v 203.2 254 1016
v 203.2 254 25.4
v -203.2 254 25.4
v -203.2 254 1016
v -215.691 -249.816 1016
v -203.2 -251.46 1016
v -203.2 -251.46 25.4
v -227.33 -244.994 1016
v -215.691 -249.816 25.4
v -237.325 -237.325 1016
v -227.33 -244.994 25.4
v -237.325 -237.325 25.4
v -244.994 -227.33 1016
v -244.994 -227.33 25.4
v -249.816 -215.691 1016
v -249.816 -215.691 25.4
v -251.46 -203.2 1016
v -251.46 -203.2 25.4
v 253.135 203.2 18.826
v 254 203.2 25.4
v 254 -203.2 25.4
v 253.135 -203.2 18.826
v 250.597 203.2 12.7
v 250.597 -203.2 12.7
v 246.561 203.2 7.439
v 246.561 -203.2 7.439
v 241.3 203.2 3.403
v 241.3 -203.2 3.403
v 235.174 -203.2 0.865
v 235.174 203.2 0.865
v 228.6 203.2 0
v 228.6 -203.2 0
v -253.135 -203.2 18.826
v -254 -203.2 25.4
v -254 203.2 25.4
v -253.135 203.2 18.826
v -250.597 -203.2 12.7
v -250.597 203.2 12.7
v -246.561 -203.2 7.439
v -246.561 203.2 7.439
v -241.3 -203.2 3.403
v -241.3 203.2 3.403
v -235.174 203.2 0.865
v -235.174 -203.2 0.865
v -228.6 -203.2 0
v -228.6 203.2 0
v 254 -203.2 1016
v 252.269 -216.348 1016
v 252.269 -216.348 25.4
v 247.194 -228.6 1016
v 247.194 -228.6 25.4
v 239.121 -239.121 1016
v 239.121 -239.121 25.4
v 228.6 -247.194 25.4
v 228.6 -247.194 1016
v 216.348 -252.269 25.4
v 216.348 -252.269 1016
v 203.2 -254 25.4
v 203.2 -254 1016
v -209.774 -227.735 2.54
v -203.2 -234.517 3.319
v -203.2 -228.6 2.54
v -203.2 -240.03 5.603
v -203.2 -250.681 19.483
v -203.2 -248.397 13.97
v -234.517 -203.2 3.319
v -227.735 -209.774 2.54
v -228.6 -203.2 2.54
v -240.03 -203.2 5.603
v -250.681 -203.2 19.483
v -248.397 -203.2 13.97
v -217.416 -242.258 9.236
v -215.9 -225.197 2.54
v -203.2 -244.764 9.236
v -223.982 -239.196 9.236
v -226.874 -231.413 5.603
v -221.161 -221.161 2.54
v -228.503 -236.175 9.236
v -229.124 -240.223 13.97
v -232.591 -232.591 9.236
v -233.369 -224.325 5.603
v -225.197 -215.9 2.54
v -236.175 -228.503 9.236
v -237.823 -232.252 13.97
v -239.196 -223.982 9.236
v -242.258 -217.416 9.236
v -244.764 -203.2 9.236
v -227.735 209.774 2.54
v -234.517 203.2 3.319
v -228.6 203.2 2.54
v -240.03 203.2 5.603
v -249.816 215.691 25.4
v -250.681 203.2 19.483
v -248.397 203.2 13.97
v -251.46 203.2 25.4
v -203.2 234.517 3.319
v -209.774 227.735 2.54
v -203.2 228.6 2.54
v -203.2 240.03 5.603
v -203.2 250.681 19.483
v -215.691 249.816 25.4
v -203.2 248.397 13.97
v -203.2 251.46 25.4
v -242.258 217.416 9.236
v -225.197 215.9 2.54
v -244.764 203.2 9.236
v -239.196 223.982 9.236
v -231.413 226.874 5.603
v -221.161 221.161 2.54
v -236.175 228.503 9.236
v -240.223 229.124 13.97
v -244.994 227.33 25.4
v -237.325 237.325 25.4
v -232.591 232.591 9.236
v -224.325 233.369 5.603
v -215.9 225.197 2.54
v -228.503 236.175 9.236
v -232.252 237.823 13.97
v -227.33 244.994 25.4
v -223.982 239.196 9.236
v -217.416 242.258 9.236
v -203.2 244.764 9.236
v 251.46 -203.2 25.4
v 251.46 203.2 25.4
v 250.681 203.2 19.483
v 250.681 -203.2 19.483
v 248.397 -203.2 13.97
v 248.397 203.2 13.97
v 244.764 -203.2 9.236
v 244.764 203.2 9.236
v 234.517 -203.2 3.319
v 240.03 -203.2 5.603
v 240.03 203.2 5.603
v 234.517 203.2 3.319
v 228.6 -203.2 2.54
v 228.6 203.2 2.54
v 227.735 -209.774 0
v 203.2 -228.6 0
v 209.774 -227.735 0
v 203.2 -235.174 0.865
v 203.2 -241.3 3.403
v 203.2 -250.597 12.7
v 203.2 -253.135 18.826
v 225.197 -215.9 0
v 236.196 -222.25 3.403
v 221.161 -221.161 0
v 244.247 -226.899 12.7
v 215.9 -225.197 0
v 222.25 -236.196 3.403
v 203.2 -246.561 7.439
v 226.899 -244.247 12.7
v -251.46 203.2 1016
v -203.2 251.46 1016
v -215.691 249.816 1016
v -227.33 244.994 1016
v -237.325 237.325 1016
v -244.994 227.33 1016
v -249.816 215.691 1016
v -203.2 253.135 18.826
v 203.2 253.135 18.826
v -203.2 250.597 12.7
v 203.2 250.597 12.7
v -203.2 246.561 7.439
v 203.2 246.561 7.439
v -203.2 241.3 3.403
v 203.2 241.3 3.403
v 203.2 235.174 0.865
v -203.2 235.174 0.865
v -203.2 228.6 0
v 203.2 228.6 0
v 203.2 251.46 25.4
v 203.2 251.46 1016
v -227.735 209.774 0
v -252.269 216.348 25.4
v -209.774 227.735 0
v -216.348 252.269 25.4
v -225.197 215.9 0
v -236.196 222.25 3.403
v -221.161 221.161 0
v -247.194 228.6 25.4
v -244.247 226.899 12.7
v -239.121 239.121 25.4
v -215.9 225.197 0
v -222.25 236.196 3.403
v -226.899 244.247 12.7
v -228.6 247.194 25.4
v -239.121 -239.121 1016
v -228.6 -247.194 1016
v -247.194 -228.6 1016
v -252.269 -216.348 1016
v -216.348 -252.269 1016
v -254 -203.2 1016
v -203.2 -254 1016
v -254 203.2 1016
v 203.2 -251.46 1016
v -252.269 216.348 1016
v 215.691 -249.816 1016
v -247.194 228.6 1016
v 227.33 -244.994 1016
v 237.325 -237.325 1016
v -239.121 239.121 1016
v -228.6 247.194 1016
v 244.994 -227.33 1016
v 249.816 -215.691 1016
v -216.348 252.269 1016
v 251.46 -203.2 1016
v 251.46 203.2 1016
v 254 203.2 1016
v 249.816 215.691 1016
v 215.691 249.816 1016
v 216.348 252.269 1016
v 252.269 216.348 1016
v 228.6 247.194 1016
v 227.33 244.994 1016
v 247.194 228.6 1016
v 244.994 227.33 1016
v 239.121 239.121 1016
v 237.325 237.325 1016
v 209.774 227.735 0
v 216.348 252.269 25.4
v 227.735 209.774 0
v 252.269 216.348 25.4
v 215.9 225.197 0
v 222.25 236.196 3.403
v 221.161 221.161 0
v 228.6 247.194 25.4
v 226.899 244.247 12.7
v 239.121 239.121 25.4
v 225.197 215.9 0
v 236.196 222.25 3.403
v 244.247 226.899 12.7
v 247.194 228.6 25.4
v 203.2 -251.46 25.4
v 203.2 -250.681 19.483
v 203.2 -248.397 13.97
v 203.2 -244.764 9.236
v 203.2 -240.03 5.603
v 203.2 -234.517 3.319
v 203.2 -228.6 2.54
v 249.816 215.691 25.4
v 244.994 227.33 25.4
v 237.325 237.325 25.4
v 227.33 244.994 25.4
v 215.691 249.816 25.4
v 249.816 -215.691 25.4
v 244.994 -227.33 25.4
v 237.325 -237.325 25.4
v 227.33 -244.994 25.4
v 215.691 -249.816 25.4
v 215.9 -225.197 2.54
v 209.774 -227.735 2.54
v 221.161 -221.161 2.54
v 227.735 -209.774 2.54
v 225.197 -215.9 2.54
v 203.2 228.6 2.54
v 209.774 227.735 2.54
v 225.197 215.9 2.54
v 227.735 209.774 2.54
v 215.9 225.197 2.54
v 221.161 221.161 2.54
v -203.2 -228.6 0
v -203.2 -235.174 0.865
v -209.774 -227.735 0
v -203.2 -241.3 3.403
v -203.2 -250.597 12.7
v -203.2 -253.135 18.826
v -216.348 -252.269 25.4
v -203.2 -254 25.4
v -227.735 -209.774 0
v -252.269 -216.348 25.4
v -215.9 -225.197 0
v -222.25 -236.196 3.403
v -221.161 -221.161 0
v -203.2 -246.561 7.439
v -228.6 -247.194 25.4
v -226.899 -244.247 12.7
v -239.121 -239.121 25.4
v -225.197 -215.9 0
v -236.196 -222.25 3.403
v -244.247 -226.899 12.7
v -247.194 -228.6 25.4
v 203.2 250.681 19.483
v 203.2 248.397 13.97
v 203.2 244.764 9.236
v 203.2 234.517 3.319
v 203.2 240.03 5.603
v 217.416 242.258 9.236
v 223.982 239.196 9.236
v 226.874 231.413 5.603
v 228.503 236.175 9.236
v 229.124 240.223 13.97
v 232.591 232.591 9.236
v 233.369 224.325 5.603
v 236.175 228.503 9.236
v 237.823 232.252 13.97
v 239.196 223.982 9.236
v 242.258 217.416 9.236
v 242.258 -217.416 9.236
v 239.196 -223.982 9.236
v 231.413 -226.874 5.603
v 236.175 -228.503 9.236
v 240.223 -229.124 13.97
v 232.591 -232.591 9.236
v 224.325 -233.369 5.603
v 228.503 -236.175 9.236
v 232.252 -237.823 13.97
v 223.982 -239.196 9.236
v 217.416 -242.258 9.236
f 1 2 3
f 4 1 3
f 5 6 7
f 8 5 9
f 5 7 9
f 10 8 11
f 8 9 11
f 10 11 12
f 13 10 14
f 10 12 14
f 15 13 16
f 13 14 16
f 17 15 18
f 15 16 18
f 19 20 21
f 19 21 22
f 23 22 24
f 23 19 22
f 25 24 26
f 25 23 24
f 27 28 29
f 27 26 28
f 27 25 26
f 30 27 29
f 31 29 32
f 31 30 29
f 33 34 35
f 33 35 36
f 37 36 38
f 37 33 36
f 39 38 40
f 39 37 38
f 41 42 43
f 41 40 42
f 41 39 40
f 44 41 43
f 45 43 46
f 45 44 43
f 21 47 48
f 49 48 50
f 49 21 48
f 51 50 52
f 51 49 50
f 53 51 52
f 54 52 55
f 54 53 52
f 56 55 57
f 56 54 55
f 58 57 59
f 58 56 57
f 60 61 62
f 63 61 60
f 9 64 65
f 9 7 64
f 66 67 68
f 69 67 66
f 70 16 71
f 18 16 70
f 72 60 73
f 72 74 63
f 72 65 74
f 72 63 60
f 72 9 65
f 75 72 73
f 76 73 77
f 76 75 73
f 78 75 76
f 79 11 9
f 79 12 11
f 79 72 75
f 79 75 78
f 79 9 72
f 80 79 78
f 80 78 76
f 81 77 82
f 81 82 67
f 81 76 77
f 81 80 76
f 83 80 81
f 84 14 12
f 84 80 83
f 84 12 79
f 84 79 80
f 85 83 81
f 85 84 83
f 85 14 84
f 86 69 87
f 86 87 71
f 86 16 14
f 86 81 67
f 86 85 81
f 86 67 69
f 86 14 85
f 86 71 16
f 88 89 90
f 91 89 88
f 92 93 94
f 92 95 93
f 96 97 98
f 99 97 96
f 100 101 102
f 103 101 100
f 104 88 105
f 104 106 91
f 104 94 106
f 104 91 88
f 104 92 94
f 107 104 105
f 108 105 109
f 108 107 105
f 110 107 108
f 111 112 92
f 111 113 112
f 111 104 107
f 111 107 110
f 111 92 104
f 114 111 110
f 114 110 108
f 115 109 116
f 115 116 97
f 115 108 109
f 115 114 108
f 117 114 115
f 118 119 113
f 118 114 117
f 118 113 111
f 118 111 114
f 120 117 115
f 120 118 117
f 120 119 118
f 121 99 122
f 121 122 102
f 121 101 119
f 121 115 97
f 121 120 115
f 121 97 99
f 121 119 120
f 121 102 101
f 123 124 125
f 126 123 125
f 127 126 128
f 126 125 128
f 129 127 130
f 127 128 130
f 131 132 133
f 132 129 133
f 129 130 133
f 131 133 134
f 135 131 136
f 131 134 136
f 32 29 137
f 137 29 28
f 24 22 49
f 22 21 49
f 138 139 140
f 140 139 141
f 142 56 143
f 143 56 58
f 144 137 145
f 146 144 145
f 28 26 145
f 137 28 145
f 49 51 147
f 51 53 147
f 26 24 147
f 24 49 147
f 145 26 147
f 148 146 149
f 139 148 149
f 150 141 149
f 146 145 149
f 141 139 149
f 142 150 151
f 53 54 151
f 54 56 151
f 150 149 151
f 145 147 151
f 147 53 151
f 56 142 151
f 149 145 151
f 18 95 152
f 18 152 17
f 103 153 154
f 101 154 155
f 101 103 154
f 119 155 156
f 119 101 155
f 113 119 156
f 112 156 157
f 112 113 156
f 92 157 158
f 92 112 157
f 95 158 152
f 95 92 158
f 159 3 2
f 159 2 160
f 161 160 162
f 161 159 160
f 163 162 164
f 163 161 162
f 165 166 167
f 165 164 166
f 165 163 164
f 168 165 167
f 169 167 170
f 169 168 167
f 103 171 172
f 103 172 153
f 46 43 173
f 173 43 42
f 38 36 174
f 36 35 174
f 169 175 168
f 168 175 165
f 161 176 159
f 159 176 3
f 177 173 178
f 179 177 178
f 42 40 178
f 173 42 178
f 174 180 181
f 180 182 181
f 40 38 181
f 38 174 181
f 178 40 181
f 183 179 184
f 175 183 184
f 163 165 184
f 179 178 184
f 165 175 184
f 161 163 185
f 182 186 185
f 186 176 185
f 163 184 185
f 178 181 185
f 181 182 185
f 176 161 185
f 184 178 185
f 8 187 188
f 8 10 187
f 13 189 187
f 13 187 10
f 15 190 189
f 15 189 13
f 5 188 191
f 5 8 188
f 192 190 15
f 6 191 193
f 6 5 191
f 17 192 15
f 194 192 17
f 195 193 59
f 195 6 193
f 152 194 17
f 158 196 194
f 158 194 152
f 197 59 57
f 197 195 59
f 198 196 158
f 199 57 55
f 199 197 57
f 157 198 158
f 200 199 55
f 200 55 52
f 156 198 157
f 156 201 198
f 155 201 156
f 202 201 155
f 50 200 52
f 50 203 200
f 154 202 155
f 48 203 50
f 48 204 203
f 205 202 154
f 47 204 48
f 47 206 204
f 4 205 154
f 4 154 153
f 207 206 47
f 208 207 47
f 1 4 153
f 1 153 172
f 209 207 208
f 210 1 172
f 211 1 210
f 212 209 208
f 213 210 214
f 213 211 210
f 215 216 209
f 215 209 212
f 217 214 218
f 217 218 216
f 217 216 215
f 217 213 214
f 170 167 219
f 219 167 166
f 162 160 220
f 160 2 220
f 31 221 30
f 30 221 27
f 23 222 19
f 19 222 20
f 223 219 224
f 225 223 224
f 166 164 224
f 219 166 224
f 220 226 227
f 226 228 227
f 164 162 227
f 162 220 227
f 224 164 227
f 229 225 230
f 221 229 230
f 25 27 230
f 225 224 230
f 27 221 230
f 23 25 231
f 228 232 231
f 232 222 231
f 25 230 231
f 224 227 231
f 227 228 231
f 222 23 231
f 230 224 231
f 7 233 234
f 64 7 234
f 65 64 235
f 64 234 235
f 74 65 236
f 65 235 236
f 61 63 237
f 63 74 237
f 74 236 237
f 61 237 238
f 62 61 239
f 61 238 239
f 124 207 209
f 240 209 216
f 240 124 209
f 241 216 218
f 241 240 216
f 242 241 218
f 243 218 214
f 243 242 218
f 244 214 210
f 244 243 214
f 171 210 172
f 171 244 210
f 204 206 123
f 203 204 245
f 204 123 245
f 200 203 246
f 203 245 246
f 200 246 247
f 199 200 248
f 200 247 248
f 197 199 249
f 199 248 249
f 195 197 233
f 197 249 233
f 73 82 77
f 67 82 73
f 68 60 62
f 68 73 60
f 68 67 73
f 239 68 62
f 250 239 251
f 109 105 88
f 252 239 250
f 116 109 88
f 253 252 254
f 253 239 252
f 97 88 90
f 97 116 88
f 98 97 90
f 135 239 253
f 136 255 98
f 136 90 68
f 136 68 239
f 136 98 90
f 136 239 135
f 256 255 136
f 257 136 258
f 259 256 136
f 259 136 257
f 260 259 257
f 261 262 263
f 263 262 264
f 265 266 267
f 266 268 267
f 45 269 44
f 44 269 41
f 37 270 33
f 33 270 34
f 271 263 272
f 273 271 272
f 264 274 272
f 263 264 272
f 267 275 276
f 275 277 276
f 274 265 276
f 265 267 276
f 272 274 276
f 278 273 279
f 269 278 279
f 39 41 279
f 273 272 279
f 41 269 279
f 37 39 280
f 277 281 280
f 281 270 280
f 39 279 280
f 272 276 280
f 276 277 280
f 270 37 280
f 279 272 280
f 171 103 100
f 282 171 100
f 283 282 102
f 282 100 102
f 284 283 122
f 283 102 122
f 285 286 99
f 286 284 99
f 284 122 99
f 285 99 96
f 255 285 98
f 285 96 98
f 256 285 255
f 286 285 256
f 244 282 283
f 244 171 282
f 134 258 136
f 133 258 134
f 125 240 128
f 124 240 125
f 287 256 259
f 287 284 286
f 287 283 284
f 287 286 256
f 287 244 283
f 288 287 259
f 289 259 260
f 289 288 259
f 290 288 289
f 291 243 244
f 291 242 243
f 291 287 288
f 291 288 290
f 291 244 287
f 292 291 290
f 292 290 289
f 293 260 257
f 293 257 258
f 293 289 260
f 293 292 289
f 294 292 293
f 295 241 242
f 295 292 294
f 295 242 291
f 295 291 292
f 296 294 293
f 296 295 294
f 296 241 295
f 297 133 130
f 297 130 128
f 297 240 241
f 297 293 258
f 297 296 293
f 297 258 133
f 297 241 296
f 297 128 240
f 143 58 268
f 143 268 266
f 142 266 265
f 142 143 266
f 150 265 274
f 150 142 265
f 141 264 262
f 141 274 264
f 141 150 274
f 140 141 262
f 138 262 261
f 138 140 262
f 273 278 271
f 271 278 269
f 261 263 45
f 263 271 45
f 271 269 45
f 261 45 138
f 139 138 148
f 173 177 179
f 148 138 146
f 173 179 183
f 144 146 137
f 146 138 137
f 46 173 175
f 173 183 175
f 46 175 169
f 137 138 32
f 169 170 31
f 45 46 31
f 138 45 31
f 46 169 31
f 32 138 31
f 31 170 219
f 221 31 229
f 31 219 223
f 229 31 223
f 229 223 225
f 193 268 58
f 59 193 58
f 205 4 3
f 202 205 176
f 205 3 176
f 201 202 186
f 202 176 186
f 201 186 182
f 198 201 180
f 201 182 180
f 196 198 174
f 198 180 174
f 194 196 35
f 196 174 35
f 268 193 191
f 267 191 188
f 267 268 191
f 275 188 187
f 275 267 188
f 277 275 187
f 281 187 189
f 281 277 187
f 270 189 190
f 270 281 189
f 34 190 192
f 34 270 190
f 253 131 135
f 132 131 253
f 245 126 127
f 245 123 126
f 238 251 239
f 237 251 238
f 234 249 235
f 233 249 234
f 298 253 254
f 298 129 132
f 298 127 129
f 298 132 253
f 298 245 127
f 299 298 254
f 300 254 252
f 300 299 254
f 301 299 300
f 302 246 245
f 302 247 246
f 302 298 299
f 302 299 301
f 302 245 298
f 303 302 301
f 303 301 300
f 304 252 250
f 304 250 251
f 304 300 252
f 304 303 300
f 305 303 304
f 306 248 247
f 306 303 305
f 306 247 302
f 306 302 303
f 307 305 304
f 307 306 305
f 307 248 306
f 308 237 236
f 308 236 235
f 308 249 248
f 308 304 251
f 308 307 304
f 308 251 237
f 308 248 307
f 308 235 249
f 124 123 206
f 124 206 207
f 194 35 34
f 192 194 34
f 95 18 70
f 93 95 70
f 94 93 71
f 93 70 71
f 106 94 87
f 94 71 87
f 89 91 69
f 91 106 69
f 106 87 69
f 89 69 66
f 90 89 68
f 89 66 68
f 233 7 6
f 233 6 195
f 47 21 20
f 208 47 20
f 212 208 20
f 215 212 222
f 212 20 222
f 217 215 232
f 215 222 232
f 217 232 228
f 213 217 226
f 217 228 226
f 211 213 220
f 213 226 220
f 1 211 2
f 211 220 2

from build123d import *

# Parameters (mm, degrees)
F1_DEPTH     = 1016
F2_R         = 25.4
F3_T1_DEPTH  = 1143
F3_T4_ANGLE  = 90
F3_T6_ANGLE  = 90
F3_T8_ANGLE  = 90
F3_T10_ANGLE = 90
F4_T         = -2.54


# Not quite as in the source:
# - a fillet or chamfer that OpenCascade refuses, or shapes differently, is made with other operations: its cross-section is extruded or revolved along the edge and cut away or added


with BuildPart() as f1:
    # F0 (on Top) → F1 (new body)
    with BuildSketch(Plane.XY):
        Polygon((254, -254), (254, 0), (254, 254), (-254, 254), (-254, -254), align=None)
    extrude(amount=F1_DEPTH)

    # F2
    f2_edges = [f1.edges().sort_by_distance(p)[0] for p in [
        (-254, 0, 0),
        (0, 254, 0),
        (0, -254, 0),
        (254, 0, 0),
    ]]
    fillet(f2_edges, radius=F2_R)

    # F3: fillet of radius 50.8 on 4 edges, made by hand

    # F3_s2 → F3_t1 (cut)
    with BuildSketch(Plane.XY):
        with BuildLine():
            ThreePointArc((-203.2, 254), (-239.1210244843, 239.1210244843), (-254, 203.2))
            Line((-254, 203.2), (-254, 254))
            Line((-254, 254), (-203.2, 254))
        make_face()
        with BuildLine():
            ThreePointArc((-203.2, -254), (-239.1210244843, -239.1210244843), (-254, -203.2))
            Line((-254, -203.2), (-254, -254))
            Line((-254, -254), (-203.2, -254))
        make_face()
        with BuildLine():
            ThreePointArc((254, 203.2), (239.1210244843, 239.1210244843), (203.2, 254))
            Line((203.2, 254), (254, 254))
            Line((254, 254), (254, 203.2))
        make_face()
        with BuildLine():
            ThreePointArc((254, -203.2), (239.1210244843, -239.1210244843), (203.2, -254))
            Line((203.2, -254), (254, -254))
            Line((254, -254), (254, -203.2))
        make_face()
    extrude(amount=F3_T1_DEPTH, mode=Mode.SUBTRACT)

    # F3_s3 → F3_t4 (revolve, cut)
    with BuildSketch(Plane.XZ.offset(203.2)):
        with BuildLine():
            ThreePointArc((228.6, 0), (246.5605122421, 7.4394877579), (254, 25.4))
            Line((254, 25.4), (254, 0))
            Line((254, 0), (228.6, 0))
        make_face()
    revolve(axis=Axis((203.2, -203.2, 0), (0, 0, -1)), revolution_arc=F3_T4_ANGLE, mode=Mode.SUBTRACT)

    # F3_s5 → F3_t6 (revolve, cut)
    with BuildSketch(Plane.YZ.offset(203.2)):
        with BuildLine():
            ThreePointArc((228.6, 0), (246.5605122421, 7.4394877579), (254, 25.4))
            Line((254, 25.4), (254, 0))
            Line((254, 0), (228.6, 0))
        make_face()
    revolve(axis=Axis((203.2, 203.2, 0), (0, 0, -1)), revolution_arc=F3_T6_ANGLE, mode=Mode.SUBTRACT)

    # F3_s7 → F3_t8 (revolve, cut)
    with BuildSketch(Plane.YZ.offset(-203.2)):
        with BuildLine():
            ThreePointArc((-228.6, 0), (-246.5605122421, 7.4394877579), (-254, 25.4))
            Line((-254, 25.4), (-254, 0))
            Line((-254, 0), (-228.6, 0))
        make_face()
    revolve(axis=Axis((-203.2, -203.2, 0), (0, 0, -1)), revolution_arc=F3_T8_ANGLE, mode=Mode.SUBTRACT)

    # F3_s9 → F3_t10 (revolve, cut)
    with BuildSketch(Plane.XZ.offset(-203.2)):
        with BuildLine():
            ThreePointArc((-228.6, 0), (-246.5605122421, 7.4394877579), (-254, 25.4))
            Line((-254, 25.4), (-254, 0))
            Line((-254, 0), (-228.6, 0))
        make_face()
    revolve(axis=Axis((-203.2, 203.2, 0), (0, 0, -1)), revolution_arc=F3_T10_ANGLE, mode=Mode.SUBTRACT)

    # F4
    f4_openings = [f1.faces().sort_by_distance(p)[0] for p in [
        (0, 0, 1016),
    ]]
    offset(amount=F4_T, openings=f4_openings)


solid = f1.part
